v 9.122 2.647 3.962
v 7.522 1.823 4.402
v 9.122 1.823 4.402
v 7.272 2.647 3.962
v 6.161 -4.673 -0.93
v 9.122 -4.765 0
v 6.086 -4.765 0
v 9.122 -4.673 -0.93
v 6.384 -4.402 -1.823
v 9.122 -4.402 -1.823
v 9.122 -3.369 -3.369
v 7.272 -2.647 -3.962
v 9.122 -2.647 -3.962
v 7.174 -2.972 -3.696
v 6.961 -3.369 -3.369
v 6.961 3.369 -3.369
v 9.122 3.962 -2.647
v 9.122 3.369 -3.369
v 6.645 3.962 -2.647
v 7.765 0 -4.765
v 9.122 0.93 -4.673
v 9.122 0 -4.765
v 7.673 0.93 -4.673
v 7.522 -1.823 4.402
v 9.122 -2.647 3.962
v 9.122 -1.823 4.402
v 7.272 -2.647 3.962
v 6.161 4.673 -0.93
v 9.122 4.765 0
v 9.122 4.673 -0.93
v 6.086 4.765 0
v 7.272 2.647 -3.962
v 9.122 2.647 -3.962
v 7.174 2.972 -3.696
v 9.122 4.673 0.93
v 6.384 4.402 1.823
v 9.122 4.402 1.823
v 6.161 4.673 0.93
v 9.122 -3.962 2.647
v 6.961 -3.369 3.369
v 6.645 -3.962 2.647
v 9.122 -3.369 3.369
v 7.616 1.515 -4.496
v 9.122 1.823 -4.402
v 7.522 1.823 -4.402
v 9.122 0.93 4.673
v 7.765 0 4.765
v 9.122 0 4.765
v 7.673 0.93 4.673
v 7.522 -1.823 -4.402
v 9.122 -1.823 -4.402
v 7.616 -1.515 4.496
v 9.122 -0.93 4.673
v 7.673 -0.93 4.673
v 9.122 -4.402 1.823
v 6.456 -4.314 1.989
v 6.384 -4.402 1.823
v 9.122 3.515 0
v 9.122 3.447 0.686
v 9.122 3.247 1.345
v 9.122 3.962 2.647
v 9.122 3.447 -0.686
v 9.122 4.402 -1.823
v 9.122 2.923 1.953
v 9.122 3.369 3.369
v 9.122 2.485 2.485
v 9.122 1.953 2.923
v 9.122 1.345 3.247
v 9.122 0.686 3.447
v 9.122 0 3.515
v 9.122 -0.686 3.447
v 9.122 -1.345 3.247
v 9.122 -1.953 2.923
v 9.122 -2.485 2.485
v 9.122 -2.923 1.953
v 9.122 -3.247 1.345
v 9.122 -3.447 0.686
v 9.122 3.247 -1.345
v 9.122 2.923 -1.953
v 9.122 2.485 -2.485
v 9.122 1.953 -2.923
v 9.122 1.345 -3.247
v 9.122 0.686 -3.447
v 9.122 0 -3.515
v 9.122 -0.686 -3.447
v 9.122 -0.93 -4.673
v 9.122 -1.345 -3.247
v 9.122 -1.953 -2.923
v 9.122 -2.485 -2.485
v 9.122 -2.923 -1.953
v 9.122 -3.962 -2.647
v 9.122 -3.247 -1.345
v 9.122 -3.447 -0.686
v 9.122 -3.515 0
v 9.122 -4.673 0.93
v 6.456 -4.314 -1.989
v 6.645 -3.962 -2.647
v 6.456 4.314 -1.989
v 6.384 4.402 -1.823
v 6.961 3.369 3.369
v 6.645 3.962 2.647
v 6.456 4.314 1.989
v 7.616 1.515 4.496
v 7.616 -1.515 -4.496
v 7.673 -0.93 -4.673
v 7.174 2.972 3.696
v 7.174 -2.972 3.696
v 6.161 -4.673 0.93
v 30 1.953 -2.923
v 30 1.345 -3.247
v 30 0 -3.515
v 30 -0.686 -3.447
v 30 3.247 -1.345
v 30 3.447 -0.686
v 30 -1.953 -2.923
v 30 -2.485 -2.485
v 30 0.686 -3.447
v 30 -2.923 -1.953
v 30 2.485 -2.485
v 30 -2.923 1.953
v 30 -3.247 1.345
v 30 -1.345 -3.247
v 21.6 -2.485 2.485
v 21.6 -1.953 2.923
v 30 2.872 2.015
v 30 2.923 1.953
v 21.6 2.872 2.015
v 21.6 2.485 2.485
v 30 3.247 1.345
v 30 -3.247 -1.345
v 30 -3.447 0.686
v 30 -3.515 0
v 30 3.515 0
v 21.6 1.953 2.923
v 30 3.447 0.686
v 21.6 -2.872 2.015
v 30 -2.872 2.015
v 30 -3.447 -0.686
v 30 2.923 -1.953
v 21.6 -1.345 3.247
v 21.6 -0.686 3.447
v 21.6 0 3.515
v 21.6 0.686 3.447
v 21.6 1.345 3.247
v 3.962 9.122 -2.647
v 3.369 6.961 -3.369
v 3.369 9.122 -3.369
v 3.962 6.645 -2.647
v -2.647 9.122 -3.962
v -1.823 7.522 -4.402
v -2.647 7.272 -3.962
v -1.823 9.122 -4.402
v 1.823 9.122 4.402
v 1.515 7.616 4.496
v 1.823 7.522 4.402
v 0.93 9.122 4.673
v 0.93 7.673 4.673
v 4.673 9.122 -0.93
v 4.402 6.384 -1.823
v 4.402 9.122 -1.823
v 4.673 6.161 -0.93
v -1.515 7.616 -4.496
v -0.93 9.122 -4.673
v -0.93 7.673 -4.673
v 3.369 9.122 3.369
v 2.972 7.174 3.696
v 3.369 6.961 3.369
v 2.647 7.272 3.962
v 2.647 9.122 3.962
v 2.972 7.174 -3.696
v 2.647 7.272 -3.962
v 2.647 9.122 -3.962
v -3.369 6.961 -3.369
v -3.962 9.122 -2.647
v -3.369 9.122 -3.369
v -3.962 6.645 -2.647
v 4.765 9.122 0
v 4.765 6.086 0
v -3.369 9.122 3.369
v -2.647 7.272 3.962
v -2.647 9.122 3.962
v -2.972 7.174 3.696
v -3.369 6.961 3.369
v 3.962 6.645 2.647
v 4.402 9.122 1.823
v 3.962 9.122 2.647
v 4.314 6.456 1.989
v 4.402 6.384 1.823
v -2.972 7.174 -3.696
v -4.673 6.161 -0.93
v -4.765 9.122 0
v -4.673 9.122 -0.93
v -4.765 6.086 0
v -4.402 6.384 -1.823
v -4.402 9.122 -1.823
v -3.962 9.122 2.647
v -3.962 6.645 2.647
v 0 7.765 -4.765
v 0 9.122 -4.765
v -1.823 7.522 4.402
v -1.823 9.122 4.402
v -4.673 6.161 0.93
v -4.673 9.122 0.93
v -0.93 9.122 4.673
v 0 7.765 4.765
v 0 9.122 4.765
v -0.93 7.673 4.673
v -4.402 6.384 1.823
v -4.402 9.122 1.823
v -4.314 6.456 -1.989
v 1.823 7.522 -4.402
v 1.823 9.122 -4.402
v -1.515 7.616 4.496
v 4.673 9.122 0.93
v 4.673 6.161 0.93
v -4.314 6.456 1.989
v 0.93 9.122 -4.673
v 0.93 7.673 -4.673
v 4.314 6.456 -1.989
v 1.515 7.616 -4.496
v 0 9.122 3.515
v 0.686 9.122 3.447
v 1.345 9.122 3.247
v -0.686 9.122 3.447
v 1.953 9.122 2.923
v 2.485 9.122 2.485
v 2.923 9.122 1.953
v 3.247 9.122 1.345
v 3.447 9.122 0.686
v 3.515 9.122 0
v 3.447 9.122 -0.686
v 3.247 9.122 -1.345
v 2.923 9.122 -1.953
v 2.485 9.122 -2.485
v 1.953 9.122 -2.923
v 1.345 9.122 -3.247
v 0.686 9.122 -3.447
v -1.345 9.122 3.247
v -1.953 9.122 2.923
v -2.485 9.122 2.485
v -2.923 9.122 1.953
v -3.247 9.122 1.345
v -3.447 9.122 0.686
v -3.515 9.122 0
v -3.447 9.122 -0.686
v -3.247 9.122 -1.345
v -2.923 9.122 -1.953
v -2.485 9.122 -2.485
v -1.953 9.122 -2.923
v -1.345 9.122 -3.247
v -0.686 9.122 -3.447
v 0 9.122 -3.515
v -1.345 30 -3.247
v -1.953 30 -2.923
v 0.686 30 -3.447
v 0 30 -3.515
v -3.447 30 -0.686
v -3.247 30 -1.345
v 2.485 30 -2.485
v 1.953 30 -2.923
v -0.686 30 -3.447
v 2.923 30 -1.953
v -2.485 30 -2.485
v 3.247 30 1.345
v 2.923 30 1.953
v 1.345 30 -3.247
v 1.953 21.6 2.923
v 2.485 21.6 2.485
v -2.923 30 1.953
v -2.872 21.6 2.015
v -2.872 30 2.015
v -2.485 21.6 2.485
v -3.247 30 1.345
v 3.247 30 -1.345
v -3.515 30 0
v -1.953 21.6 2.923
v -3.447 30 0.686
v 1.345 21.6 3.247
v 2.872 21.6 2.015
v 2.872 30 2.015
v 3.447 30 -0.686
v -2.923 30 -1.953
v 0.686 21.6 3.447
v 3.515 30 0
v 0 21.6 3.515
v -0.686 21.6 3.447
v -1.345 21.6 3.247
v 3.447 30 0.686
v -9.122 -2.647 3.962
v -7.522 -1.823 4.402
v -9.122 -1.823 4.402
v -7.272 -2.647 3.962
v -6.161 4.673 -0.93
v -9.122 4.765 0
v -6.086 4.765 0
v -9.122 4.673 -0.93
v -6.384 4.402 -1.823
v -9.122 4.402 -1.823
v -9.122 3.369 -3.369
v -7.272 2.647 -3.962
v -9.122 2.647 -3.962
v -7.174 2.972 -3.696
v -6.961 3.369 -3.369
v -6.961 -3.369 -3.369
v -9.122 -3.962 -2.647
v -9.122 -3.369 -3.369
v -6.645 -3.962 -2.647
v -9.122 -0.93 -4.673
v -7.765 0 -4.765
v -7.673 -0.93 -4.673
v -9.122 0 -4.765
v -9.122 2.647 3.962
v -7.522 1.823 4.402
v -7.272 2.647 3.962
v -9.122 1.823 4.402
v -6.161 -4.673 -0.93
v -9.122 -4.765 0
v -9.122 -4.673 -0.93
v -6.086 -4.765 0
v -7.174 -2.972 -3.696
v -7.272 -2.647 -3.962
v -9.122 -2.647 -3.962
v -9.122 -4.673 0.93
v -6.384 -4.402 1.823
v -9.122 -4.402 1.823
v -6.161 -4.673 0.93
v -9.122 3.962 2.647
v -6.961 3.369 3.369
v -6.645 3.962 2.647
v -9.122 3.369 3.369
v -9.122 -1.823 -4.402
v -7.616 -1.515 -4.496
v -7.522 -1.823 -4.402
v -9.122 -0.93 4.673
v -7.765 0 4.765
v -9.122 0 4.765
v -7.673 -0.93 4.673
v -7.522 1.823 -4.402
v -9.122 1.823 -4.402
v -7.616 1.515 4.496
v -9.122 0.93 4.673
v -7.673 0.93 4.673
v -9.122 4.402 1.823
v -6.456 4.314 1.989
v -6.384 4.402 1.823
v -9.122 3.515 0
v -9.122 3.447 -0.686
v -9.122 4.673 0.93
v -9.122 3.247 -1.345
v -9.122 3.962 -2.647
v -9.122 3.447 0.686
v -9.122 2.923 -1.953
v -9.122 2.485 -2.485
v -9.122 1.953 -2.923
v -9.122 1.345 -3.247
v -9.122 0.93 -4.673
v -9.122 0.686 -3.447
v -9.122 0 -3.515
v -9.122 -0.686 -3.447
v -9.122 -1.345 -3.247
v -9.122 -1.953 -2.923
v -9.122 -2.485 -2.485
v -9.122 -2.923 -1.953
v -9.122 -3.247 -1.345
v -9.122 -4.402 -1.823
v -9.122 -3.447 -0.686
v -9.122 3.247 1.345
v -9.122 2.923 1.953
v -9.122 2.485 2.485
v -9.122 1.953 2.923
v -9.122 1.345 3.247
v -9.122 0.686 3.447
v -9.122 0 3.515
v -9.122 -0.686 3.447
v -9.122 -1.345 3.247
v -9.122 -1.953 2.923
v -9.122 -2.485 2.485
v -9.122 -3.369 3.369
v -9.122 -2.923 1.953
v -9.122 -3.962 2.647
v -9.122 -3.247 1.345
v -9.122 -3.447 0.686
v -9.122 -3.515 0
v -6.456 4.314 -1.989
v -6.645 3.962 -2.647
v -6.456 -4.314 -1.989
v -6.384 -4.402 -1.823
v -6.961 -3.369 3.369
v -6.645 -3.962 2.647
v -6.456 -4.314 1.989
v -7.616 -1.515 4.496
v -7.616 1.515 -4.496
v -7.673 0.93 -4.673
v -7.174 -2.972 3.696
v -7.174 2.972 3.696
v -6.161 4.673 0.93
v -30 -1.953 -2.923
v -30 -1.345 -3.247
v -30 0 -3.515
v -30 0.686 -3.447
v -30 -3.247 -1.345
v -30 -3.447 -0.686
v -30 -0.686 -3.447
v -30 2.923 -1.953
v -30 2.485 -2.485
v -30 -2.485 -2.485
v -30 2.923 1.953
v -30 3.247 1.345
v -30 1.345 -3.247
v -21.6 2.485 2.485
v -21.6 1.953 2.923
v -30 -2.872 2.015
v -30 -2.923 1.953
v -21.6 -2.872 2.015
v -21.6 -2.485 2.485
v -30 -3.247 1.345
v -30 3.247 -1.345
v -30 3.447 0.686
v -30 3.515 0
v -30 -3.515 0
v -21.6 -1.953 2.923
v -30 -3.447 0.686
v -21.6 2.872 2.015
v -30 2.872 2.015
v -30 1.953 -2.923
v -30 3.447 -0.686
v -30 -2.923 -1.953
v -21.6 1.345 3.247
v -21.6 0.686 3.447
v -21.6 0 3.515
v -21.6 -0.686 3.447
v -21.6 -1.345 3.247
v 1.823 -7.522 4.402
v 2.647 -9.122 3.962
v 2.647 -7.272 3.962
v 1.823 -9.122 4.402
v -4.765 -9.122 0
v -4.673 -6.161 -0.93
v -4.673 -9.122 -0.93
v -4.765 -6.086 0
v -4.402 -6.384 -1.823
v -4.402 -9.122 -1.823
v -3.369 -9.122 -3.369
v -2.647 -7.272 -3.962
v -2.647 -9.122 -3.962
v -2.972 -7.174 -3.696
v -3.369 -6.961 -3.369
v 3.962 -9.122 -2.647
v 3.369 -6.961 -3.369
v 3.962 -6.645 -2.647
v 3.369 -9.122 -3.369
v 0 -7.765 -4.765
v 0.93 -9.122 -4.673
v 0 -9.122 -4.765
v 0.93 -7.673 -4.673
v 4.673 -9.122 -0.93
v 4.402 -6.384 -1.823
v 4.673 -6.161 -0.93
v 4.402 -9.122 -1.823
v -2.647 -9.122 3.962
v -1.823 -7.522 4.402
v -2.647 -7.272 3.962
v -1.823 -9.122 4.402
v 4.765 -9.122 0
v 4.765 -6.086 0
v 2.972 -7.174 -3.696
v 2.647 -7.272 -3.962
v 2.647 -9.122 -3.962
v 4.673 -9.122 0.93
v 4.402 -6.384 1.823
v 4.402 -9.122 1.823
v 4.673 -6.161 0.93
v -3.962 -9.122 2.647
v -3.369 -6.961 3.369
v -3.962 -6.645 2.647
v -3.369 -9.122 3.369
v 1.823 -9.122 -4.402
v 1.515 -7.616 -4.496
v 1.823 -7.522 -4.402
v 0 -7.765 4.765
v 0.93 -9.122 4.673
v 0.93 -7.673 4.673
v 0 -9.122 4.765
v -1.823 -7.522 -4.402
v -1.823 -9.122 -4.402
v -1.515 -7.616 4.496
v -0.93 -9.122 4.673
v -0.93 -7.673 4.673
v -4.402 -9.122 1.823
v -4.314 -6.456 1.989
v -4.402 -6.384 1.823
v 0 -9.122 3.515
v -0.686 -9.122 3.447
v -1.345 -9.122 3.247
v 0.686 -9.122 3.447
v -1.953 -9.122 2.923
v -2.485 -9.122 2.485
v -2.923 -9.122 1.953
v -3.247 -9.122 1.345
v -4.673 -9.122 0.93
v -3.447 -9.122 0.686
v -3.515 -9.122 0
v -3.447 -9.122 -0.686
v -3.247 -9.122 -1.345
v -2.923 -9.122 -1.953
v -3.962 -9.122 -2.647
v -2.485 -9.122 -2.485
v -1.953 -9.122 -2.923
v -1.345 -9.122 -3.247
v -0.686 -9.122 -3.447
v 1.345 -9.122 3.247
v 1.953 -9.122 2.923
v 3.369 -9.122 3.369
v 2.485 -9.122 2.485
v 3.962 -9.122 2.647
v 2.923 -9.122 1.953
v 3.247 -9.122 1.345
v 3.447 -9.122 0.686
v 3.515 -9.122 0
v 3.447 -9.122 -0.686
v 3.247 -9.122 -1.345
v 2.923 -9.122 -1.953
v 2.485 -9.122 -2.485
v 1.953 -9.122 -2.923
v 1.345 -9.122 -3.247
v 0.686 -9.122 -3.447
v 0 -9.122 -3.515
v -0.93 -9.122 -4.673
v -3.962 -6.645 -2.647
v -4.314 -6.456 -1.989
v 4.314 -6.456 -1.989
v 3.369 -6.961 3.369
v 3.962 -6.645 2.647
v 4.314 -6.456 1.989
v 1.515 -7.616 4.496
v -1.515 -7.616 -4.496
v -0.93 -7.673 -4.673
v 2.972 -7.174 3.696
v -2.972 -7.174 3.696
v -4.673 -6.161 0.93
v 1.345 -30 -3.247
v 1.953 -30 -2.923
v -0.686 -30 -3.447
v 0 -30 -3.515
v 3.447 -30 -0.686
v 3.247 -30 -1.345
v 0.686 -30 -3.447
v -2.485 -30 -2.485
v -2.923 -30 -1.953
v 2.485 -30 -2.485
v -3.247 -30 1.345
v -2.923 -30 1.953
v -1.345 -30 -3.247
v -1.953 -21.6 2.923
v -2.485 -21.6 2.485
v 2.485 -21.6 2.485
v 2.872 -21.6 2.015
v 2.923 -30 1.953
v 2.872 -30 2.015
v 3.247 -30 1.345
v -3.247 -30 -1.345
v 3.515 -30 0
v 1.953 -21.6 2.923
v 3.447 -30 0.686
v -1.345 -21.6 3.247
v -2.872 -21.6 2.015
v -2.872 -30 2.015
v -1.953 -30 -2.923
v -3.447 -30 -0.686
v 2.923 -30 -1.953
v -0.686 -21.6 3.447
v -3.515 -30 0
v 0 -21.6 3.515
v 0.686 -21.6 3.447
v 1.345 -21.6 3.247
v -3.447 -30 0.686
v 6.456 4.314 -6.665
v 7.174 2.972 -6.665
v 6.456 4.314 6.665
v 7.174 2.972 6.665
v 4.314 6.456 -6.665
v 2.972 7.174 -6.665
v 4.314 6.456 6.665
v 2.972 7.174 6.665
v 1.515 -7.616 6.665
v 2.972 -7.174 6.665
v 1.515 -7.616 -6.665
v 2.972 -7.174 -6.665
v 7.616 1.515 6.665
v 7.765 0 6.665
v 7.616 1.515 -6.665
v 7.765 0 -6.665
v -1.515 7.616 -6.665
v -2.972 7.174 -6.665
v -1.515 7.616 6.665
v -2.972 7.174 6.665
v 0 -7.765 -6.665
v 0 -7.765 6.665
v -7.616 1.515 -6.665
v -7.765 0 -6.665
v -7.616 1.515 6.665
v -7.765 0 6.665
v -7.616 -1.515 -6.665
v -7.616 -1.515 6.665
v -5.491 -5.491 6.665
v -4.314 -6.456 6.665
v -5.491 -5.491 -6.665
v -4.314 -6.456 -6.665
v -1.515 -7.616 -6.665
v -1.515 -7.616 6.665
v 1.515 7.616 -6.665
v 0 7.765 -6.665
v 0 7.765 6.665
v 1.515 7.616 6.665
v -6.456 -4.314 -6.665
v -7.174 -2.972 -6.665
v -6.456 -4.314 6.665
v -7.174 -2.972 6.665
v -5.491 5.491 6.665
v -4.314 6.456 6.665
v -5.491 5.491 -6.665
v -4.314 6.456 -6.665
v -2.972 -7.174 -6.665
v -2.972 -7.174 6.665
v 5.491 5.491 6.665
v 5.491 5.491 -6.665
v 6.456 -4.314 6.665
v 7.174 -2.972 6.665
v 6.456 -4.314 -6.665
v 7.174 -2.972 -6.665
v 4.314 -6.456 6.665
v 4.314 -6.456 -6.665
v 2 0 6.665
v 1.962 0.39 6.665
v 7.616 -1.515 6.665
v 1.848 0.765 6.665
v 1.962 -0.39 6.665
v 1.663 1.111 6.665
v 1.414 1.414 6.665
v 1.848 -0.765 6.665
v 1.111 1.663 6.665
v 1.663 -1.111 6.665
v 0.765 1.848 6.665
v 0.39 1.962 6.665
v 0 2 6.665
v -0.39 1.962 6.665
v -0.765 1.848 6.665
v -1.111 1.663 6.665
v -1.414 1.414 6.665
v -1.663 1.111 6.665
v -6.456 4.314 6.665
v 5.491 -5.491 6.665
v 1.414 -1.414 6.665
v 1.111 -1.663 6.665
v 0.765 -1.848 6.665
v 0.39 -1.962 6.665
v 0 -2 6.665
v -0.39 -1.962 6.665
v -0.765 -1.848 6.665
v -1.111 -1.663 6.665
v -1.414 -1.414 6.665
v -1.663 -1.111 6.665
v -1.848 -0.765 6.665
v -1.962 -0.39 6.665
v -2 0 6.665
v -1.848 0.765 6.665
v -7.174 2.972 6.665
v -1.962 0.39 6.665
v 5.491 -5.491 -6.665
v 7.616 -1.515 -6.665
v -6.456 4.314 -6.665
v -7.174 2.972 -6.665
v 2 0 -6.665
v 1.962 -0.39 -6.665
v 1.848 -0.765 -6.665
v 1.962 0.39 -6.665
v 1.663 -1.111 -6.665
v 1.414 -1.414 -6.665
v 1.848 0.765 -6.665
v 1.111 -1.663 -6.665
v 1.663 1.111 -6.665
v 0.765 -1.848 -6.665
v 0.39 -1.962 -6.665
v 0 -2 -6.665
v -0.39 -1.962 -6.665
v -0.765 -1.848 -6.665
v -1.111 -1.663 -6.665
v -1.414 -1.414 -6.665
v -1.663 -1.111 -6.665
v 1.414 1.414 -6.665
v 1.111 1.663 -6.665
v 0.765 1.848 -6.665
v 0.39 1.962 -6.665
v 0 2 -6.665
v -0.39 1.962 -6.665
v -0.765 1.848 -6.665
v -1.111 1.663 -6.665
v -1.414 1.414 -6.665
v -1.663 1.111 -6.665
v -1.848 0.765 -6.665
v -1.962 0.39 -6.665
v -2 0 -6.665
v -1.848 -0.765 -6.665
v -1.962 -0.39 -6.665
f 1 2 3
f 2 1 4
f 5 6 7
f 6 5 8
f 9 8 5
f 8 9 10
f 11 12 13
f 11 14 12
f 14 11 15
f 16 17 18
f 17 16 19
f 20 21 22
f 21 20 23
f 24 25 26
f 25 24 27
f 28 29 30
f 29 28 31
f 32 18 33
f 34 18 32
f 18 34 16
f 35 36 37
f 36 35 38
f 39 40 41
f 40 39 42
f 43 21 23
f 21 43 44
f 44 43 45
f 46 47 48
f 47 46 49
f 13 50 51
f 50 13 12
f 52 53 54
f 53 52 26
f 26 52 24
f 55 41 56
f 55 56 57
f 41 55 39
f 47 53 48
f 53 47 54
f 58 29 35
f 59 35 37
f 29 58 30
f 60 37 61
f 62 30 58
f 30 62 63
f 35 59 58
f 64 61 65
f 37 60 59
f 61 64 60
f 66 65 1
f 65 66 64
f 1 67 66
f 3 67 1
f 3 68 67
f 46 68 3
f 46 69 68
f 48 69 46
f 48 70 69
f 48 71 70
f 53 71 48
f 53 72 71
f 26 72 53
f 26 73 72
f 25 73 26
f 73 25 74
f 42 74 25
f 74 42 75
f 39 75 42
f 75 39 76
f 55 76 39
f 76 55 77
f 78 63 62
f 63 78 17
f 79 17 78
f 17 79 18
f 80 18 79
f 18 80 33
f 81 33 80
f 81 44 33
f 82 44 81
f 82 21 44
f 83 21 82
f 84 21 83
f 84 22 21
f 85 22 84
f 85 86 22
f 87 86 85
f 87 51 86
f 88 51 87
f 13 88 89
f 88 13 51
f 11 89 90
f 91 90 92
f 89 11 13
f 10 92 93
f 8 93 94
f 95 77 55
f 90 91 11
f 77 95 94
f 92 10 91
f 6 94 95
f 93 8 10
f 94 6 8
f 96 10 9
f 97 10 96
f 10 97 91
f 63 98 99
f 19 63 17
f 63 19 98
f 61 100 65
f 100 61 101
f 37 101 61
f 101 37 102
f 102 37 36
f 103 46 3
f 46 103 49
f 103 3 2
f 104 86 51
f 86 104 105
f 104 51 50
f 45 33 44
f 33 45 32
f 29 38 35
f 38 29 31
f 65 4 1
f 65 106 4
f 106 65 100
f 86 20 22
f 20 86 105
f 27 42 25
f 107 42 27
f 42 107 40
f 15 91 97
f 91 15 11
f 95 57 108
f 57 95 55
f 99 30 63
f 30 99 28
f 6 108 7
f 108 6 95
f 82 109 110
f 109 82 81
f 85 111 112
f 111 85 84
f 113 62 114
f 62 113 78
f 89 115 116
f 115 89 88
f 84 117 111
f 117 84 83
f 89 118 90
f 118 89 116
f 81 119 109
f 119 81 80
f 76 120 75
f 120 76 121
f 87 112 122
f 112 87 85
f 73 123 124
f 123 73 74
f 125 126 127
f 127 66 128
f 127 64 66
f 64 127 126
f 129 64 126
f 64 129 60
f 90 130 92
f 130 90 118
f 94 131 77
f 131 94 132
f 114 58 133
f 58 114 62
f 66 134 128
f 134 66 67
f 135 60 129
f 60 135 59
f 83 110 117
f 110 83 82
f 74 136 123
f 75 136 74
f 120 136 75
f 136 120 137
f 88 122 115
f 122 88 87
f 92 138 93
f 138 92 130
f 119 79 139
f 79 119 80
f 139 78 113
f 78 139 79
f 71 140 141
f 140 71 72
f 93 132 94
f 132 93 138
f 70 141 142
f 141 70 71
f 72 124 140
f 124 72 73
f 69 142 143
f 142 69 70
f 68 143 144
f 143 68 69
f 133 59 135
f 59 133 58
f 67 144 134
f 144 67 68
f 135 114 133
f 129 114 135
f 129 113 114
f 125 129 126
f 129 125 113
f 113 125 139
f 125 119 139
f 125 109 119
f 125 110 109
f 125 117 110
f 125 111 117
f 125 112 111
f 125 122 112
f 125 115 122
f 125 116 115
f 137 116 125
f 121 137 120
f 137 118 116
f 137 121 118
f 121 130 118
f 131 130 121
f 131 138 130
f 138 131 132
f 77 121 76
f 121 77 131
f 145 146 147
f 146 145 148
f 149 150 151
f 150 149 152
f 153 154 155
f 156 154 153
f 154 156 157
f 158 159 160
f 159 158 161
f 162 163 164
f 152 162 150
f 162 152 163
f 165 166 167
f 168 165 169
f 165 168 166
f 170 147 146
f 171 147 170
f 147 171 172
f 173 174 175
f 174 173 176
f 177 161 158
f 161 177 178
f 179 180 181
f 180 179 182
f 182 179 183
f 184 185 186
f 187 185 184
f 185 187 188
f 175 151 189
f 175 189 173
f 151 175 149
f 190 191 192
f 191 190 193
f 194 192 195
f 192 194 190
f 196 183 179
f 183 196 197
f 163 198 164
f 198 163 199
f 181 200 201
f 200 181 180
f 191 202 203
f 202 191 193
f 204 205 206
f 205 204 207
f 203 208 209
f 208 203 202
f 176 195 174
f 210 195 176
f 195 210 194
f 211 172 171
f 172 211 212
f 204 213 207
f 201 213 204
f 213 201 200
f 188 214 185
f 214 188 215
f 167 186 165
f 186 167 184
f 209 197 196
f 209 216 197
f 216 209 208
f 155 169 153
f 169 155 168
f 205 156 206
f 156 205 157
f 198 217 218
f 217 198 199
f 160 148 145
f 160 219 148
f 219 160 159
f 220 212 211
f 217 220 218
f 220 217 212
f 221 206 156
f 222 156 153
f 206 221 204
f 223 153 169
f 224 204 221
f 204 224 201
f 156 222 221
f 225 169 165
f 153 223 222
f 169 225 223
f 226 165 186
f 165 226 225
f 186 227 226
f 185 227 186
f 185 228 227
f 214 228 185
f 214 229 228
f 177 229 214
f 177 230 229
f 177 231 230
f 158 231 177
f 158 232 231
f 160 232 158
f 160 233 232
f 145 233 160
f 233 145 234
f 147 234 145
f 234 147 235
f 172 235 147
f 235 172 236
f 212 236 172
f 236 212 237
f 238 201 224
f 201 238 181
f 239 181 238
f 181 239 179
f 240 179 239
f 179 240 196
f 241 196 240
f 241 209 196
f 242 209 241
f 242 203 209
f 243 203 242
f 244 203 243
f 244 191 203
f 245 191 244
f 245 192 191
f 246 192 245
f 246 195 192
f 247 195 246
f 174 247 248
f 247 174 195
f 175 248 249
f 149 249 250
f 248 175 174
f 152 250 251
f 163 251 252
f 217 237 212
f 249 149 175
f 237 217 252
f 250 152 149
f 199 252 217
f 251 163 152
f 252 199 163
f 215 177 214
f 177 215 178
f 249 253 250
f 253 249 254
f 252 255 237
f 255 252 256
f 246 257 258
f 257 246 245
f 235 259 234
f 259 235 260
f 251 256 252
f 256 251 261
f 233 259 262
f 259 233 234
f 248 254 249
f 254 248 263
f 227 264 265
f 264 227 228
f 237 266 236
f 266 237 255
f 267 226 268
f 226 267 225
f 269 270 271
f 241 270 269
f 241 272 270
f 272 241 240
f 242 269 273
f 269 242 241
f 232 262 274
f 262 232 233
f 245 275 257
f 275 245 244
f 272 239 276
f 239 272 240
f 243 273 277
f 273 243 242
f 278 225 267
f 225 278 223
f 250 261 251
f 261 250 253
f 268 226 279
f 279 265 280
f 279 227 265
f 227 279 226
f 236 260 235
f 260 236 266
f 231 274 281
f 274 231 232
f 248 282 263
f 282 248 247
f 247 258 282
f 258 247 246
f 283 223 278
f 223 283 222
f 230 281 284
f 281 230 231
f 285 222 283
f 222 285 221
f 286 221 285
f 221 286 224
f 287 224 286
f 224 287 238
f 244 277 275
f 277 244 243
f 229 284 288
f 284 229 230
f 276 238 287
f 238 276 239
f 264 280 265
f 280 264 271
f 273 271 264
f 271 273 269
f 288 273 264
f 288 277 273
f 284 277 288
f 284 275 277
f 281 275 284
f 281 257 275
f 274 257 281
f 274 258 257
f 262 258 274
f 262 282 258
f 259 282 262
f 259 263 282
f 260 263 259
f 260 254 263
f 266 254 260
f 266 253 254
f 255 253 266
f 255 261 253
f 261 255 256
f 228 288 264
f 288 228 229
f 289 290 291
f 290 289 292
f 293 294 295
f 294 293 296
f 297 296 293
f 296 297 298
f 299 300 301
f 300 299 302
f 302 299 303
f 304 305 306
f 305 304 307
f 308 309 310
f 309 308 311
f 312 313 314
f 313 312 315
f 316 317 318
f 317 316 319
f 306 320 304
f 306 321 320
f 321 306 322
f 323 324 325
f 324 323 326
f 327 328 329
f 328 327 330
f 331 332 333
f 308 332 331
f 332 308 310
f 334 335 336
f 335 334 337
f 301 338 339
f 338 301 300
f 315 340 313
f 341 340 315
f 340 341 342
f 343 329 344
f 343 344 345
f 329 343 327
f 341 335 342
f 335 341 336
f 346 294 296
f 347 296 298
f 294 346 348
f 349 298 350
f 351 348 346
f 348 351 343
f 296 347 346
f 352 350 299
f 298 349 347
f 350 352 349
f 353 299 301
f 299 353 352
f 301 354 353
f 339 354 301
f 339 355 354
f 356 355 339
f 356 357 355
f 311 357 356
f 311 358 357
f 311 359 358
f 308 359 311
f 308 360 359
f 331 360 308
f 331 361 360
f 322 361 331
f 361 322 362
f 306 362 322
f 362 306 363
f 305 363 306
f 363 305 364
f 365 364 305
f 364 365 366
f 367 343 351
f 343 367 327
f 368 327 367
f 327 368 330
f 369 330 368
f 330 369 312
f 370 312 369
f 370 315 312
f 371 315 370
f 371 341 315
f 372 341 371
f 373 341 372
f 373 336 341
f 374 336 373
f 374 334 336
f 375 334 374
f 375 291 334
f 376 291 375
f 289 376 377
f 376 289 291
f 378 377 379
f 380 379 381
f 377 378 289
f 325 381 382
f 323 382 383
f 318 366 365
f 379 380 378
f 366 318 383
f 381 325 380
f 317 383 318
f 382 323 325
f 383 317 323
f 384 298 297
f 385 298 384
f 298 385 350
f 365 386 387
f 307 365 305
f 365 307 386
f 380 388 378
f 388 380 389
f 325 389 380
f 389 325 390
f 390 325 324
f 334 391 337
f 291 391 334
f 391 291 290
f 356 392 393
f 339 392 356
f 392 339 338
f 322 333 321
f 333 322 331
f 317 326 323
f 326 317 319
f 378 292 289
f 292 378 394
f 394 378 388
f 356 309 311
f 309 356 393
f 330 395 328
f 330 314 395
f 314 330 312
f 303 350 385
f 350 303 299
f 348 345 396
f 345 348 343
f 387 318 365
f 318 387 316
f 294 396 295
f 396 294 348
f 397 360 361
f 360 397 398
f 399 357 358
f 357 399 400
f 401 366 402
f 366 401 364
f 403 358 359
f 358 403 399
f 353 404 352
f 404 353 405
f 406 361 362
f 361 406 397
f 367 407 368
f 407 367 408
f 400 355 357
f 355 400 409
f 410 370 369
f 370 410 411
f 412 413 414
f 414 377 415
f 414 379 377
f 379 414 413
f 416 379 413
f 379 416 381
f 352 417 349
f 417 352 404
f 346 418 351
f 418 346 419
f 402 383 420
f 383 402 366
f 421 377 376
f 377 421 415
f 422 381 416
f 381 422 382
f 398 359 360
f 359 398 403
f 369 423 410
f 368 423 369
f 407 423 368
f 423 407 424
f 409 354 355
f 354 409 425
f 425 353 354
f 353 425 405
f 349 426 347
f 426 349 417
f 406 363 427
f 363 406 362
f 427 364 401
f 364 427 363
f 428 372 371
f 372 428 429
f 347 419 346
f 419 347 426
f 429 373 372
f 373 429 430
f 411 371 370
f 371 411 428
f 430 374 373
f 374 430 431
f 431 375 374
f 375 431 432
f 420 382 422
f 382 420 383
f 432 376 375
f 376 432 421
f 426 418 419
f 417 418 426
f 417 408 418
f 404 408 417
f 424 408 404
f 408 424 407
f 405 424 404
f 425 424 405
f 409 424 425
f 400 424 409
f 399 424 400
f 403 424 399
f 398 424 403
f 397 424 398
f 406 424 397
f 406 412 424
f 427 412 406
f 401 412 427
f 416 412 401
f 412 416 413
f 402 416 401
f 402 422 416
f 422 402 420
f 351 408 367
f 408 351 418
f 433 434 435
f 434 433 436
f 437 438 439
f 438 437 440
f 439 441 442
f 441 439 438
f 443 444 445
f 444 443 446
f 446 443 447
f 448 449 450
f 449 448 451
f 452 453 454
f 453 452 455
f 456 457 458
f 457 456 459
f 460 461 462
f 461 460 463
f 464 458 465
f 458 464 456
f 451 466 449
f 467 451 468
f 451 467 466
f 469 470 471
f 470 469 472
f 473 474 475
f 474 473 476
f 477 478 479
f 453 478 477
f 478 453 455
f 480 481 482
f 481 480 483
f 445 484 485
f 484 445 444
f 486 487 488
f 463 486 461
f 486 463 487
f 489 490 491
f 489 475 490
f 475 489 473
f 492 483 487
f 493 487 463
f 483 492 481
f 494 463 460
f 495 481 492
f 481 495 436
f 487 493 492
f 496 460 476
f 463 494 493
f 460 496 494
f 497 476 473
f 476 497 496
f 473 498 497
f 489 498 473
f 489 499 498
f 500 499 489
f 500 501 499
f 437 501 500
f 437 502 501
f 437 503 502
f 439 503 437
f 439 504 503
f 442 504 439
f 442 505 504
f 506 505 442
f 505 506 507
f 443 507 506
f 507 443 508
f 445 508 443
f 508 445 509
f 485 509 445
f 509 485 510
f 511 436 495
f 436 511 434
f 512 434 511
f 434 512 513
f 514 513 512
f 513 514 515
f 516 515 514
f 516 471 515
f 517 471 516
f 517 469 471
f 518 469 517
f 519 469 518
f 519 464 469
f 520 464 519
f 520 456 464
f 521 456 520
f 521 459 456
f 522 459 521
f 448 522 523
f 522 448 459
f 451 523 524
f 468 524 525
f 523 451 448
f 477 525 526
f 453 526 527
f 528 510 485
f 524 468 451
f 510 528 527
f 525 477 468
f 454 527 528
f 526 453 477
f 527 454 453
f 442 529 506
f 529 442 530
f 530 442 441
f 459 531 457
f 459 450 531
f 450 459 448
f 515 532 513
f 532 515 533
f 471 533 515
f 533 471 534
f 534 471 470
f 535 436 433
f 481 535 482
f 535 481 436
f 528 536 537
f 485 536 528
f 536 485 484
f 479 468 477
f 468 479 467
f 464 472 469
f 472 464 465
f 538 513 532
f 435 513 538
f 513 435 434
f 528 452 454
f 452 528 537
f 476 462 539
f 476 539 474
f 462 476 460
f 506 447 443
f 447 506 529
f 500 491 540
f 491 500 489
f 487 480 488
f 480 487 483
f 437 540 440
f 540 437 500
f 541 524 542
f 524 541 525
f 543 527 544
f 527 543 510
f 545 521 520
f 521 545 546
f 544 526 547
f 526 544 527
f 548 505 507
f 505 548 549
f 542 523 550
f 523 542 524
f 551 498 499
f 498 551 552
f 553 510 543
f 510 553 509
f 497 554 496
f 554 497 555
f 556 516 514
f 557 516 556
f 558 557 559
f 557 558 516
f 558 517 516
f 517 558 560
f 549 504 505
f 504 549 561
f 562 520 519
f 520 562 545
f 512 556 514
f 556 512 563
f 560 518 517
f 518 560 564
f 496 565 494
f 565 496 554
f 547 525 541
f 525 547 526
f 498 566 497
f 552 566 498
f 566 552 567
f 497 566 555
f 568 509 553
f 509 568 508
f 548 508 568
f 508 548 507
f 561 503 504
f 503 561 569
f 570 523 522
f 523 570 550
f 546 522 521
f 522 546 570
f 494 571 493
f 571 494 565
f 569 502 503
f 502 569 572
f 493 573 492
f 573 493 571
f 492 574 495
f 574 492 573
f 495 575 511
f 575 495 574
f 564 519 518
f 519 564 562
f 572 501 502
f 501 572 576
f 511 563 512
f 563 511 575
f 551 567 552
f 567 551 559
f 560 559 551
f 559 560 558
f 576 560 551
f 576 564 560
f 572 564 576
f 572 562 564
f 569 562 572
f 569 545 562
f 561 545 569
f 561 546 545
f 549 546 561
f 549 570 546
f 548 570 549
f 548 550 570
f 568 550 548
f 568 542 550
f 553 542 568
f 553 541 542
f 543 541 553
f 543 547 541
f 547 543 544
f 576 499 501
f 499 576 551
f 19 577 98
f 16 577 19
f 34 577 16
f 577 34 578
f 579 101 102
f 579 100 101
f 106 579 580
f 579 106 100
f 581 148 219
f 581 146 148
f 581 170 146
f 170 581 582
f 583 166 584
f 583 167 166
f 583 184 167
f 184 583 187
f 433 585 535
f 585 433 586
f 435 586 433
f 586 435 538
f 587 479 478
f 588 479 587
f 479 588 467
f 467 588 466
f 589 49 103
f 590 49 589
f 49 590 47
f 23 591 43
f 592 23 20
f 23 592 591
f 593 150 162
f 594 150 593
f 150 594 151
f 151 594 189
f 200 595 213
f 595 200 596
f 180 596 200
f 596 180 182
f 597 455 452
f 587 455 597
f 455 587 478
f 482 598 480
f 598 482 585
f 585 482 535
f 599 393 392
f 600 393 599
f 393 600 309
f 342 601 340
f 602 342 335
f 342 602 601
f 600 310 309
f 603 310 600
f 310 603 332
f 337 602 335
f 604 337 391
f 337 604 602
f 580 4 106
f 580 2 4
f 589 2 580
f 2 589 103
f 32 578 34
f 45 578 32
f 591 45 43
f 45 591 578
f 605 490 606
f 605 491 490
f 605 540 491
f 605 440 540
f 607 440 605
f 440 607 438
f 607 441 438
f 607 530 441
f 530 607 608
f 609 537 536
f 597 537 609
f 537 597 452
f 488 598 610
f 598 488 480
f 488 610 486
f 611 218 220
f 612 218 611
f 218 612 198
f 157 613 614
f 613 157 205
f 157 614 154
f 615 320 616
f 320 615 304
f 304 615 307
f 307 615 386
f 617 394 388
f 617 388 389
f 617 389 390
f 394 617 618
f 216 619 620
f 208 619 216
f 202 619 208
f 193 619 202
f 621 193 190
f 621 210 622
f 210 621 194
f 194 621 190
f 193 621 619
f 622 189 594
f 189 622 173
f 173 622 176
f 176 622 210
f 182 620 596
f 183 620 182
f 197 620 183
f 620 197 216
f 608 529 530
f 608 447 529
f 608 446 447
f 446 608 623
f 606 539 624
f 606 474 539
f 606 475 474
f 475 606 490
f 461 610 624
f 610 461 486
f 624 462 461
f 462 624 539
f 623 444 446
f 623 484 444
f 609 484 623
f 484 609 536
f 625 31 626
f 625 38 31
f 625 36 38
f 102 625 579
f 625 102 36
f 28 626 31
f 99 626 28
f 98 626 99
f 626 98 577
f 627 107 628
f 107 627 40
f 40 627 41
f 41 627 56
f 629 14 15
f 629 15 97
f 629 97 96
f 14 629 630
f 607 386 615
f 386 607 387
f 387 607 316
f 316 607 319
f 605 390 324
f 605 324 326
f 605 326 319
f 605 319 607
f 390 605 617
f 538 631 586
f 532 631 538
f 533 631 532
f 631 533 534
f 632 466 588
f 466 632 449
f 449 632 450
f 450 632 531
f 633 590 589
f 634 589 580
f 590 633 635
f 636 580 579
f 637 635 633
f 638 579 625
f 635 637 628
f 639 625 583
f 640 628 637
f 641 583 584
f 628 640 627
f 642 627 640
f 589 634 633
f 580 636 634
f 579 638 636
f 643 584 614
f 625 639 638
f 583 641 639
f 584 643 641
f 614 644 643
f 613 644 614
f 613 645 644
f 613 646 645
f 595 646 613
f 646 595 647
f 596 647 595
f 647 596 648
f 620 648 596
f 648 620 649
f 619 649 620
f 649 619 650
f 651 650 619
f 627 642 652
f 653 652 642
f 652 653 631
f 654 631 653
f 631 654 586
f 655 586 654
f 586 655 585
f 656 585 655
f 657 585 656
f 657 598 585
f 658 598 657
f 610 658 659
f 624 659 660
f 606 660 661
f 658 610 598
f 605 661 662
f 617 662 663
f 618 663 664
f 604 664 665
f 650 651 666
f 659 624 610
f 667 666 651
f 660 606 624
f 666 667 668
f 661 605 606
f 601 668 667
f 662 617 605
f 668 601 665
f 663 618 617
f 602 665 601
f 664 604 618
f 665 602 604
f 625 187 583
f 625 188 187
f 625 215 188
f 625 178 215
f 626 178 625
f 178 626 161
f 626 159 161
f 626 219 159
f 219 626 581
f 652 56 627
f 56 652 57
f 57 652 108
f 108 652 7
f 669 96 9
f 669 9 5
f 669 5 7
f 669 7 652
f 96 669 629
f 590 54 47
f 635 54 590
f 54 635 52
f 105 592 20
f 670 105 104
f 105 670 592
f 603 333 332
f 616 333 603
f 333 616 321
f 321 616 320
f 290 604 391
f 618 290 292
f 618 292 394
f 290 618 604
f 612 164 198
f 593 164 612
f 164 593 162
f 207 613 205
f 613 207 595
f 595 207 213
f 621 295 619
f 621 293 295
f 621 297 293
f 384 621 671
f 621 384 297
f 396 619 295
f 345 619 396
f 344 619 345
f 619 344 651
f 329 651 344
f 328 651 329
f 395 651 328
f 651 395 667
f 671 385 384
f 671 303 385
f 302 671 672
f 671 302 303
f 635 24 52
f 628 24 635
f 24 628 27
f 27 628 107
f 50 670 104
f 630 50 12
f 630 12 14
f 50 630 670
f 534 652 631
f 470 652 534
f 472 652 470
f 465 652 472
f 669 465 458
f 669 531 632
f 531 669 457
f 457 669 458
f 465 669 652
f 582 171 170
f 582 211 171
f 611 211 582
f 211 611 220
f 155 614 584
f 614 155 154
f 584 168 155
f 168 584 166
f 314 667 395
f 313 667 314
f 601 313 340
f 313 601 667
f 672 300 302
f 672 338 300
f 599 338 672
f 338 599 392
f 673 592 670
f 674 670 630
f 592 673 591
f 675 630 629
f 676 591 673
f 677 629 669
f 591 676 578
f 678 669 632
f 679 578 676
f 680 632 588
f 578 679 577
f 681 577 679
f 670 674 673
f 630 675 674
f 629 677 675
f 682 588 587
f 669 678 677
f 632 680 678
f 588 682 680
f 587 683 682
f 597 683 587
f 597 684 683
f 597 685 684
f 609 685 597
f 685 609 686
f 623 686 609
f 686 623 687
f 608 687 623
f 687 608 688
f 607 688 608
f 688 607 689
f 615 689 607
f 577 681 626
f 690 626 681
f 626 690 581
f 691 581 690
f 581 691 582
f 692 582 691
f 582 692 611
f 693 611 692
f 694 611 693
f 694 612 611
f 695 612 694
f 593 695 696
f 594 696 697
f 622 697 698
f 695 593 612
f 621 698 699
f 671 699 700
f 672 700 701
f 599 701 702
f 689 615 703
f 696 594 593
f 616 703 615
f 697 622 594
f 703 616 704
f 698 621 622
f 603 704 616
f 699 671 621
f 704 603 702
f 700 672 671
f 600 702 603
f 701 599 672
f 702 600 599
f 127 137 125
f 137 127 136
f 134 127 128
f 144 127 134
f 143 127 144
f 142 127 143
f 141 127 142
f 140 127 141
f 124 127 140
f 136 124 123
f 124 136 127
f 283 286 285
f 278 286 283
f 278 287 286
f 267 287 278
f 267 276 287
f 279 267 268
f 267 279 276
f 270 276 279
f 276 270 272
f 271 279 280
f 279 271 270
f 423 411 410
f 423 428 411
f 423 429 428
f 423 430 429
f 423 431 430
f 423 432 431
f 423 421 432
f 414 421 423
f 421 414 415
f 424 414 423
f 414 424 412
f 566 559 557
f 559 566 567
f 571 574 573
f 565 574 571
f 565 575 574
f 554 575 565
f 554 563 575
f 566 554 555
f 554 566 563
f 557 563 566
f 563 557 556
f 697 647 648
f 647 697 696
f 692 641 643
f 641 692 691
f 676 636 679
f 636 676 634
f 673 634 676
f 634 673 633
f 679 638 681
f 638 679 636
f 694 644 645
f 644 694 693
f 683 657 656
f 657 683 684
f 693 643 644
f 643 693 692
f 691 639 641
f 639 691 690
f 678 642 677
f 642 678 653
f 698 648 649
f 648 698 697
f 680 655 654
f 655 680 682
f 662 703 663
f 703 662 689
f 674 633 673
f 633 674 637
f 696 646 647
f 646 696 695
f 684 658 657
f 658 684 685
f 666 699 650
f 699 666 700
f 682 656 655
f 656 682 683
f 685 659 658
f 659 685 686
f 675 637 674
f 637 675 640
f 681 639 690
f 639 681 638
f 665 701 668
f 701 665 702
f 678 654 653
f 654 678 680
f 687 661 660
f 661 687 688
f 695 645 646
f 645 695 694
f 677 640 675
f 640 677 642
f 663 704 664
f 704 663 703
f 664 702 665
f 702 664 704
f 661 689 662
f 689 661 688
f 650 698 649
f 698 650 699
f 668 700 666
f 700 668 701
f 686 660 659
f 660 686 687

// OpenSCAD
$fn = 32;

// ----------------------------------------------------------------------
// Cardan cross: 60 mm span, 9.53 mm trunnions
// ----------------------------------------------------------------------

// --- parameters (mm) ---
journal_d = 9.53;         // trunnion diameter
arm_len = 30;             // trunnion length from the centre
step_r = 3.24;            // step position from the centre
step_d = 7.03;            // journal diameter after the step
hub_d = 15.53;            // hub diameter
hub_h = 13.33;            // hub height
bore_d = 4;               // hub bore
flat_d = 1.5;             // depth of the journal flat
flat_len = 8.4;           // length of the journal flat

difference() {
  union() {
    /* hub along the joint axis */
    cylinder(h = hub_h, d = hub_d, center = true);
    for (a = [0 : 90 : 270]) rotate([0, 0, a]) {
      /* trunnion, sunk into the hub */
      translate([hub_d / 4, 0, 0]) rotate([0, 90, 0]) cylinder(h = step_r + 2, d = journal_d);
      /* stepped journal out to the tip */
      translate([step_r - 0.5, 0, 0]) rotate([0, 90, 0]) cylinder(h = arm_len + 0.5 - step_r, d = step_d);
    }
  }
  /* lubrication bore through the hub, 2.5 mm clear on both sides */
  translate([0, 0, -hub_h / 2 - 2.5]) cylinder(h = hub_h + 5, d = bore_d);
  /* machined flat on each journal tip */
  for (a = [0 : 90 : 270]) rotate([0, 0, a]) {
    translate([arm_len - flat_len, -step_d, step_d / 2 - flat_d]) cube([flat_len + 0.5, 2 * step_d, flat_d + 2.5]);
  }
}
